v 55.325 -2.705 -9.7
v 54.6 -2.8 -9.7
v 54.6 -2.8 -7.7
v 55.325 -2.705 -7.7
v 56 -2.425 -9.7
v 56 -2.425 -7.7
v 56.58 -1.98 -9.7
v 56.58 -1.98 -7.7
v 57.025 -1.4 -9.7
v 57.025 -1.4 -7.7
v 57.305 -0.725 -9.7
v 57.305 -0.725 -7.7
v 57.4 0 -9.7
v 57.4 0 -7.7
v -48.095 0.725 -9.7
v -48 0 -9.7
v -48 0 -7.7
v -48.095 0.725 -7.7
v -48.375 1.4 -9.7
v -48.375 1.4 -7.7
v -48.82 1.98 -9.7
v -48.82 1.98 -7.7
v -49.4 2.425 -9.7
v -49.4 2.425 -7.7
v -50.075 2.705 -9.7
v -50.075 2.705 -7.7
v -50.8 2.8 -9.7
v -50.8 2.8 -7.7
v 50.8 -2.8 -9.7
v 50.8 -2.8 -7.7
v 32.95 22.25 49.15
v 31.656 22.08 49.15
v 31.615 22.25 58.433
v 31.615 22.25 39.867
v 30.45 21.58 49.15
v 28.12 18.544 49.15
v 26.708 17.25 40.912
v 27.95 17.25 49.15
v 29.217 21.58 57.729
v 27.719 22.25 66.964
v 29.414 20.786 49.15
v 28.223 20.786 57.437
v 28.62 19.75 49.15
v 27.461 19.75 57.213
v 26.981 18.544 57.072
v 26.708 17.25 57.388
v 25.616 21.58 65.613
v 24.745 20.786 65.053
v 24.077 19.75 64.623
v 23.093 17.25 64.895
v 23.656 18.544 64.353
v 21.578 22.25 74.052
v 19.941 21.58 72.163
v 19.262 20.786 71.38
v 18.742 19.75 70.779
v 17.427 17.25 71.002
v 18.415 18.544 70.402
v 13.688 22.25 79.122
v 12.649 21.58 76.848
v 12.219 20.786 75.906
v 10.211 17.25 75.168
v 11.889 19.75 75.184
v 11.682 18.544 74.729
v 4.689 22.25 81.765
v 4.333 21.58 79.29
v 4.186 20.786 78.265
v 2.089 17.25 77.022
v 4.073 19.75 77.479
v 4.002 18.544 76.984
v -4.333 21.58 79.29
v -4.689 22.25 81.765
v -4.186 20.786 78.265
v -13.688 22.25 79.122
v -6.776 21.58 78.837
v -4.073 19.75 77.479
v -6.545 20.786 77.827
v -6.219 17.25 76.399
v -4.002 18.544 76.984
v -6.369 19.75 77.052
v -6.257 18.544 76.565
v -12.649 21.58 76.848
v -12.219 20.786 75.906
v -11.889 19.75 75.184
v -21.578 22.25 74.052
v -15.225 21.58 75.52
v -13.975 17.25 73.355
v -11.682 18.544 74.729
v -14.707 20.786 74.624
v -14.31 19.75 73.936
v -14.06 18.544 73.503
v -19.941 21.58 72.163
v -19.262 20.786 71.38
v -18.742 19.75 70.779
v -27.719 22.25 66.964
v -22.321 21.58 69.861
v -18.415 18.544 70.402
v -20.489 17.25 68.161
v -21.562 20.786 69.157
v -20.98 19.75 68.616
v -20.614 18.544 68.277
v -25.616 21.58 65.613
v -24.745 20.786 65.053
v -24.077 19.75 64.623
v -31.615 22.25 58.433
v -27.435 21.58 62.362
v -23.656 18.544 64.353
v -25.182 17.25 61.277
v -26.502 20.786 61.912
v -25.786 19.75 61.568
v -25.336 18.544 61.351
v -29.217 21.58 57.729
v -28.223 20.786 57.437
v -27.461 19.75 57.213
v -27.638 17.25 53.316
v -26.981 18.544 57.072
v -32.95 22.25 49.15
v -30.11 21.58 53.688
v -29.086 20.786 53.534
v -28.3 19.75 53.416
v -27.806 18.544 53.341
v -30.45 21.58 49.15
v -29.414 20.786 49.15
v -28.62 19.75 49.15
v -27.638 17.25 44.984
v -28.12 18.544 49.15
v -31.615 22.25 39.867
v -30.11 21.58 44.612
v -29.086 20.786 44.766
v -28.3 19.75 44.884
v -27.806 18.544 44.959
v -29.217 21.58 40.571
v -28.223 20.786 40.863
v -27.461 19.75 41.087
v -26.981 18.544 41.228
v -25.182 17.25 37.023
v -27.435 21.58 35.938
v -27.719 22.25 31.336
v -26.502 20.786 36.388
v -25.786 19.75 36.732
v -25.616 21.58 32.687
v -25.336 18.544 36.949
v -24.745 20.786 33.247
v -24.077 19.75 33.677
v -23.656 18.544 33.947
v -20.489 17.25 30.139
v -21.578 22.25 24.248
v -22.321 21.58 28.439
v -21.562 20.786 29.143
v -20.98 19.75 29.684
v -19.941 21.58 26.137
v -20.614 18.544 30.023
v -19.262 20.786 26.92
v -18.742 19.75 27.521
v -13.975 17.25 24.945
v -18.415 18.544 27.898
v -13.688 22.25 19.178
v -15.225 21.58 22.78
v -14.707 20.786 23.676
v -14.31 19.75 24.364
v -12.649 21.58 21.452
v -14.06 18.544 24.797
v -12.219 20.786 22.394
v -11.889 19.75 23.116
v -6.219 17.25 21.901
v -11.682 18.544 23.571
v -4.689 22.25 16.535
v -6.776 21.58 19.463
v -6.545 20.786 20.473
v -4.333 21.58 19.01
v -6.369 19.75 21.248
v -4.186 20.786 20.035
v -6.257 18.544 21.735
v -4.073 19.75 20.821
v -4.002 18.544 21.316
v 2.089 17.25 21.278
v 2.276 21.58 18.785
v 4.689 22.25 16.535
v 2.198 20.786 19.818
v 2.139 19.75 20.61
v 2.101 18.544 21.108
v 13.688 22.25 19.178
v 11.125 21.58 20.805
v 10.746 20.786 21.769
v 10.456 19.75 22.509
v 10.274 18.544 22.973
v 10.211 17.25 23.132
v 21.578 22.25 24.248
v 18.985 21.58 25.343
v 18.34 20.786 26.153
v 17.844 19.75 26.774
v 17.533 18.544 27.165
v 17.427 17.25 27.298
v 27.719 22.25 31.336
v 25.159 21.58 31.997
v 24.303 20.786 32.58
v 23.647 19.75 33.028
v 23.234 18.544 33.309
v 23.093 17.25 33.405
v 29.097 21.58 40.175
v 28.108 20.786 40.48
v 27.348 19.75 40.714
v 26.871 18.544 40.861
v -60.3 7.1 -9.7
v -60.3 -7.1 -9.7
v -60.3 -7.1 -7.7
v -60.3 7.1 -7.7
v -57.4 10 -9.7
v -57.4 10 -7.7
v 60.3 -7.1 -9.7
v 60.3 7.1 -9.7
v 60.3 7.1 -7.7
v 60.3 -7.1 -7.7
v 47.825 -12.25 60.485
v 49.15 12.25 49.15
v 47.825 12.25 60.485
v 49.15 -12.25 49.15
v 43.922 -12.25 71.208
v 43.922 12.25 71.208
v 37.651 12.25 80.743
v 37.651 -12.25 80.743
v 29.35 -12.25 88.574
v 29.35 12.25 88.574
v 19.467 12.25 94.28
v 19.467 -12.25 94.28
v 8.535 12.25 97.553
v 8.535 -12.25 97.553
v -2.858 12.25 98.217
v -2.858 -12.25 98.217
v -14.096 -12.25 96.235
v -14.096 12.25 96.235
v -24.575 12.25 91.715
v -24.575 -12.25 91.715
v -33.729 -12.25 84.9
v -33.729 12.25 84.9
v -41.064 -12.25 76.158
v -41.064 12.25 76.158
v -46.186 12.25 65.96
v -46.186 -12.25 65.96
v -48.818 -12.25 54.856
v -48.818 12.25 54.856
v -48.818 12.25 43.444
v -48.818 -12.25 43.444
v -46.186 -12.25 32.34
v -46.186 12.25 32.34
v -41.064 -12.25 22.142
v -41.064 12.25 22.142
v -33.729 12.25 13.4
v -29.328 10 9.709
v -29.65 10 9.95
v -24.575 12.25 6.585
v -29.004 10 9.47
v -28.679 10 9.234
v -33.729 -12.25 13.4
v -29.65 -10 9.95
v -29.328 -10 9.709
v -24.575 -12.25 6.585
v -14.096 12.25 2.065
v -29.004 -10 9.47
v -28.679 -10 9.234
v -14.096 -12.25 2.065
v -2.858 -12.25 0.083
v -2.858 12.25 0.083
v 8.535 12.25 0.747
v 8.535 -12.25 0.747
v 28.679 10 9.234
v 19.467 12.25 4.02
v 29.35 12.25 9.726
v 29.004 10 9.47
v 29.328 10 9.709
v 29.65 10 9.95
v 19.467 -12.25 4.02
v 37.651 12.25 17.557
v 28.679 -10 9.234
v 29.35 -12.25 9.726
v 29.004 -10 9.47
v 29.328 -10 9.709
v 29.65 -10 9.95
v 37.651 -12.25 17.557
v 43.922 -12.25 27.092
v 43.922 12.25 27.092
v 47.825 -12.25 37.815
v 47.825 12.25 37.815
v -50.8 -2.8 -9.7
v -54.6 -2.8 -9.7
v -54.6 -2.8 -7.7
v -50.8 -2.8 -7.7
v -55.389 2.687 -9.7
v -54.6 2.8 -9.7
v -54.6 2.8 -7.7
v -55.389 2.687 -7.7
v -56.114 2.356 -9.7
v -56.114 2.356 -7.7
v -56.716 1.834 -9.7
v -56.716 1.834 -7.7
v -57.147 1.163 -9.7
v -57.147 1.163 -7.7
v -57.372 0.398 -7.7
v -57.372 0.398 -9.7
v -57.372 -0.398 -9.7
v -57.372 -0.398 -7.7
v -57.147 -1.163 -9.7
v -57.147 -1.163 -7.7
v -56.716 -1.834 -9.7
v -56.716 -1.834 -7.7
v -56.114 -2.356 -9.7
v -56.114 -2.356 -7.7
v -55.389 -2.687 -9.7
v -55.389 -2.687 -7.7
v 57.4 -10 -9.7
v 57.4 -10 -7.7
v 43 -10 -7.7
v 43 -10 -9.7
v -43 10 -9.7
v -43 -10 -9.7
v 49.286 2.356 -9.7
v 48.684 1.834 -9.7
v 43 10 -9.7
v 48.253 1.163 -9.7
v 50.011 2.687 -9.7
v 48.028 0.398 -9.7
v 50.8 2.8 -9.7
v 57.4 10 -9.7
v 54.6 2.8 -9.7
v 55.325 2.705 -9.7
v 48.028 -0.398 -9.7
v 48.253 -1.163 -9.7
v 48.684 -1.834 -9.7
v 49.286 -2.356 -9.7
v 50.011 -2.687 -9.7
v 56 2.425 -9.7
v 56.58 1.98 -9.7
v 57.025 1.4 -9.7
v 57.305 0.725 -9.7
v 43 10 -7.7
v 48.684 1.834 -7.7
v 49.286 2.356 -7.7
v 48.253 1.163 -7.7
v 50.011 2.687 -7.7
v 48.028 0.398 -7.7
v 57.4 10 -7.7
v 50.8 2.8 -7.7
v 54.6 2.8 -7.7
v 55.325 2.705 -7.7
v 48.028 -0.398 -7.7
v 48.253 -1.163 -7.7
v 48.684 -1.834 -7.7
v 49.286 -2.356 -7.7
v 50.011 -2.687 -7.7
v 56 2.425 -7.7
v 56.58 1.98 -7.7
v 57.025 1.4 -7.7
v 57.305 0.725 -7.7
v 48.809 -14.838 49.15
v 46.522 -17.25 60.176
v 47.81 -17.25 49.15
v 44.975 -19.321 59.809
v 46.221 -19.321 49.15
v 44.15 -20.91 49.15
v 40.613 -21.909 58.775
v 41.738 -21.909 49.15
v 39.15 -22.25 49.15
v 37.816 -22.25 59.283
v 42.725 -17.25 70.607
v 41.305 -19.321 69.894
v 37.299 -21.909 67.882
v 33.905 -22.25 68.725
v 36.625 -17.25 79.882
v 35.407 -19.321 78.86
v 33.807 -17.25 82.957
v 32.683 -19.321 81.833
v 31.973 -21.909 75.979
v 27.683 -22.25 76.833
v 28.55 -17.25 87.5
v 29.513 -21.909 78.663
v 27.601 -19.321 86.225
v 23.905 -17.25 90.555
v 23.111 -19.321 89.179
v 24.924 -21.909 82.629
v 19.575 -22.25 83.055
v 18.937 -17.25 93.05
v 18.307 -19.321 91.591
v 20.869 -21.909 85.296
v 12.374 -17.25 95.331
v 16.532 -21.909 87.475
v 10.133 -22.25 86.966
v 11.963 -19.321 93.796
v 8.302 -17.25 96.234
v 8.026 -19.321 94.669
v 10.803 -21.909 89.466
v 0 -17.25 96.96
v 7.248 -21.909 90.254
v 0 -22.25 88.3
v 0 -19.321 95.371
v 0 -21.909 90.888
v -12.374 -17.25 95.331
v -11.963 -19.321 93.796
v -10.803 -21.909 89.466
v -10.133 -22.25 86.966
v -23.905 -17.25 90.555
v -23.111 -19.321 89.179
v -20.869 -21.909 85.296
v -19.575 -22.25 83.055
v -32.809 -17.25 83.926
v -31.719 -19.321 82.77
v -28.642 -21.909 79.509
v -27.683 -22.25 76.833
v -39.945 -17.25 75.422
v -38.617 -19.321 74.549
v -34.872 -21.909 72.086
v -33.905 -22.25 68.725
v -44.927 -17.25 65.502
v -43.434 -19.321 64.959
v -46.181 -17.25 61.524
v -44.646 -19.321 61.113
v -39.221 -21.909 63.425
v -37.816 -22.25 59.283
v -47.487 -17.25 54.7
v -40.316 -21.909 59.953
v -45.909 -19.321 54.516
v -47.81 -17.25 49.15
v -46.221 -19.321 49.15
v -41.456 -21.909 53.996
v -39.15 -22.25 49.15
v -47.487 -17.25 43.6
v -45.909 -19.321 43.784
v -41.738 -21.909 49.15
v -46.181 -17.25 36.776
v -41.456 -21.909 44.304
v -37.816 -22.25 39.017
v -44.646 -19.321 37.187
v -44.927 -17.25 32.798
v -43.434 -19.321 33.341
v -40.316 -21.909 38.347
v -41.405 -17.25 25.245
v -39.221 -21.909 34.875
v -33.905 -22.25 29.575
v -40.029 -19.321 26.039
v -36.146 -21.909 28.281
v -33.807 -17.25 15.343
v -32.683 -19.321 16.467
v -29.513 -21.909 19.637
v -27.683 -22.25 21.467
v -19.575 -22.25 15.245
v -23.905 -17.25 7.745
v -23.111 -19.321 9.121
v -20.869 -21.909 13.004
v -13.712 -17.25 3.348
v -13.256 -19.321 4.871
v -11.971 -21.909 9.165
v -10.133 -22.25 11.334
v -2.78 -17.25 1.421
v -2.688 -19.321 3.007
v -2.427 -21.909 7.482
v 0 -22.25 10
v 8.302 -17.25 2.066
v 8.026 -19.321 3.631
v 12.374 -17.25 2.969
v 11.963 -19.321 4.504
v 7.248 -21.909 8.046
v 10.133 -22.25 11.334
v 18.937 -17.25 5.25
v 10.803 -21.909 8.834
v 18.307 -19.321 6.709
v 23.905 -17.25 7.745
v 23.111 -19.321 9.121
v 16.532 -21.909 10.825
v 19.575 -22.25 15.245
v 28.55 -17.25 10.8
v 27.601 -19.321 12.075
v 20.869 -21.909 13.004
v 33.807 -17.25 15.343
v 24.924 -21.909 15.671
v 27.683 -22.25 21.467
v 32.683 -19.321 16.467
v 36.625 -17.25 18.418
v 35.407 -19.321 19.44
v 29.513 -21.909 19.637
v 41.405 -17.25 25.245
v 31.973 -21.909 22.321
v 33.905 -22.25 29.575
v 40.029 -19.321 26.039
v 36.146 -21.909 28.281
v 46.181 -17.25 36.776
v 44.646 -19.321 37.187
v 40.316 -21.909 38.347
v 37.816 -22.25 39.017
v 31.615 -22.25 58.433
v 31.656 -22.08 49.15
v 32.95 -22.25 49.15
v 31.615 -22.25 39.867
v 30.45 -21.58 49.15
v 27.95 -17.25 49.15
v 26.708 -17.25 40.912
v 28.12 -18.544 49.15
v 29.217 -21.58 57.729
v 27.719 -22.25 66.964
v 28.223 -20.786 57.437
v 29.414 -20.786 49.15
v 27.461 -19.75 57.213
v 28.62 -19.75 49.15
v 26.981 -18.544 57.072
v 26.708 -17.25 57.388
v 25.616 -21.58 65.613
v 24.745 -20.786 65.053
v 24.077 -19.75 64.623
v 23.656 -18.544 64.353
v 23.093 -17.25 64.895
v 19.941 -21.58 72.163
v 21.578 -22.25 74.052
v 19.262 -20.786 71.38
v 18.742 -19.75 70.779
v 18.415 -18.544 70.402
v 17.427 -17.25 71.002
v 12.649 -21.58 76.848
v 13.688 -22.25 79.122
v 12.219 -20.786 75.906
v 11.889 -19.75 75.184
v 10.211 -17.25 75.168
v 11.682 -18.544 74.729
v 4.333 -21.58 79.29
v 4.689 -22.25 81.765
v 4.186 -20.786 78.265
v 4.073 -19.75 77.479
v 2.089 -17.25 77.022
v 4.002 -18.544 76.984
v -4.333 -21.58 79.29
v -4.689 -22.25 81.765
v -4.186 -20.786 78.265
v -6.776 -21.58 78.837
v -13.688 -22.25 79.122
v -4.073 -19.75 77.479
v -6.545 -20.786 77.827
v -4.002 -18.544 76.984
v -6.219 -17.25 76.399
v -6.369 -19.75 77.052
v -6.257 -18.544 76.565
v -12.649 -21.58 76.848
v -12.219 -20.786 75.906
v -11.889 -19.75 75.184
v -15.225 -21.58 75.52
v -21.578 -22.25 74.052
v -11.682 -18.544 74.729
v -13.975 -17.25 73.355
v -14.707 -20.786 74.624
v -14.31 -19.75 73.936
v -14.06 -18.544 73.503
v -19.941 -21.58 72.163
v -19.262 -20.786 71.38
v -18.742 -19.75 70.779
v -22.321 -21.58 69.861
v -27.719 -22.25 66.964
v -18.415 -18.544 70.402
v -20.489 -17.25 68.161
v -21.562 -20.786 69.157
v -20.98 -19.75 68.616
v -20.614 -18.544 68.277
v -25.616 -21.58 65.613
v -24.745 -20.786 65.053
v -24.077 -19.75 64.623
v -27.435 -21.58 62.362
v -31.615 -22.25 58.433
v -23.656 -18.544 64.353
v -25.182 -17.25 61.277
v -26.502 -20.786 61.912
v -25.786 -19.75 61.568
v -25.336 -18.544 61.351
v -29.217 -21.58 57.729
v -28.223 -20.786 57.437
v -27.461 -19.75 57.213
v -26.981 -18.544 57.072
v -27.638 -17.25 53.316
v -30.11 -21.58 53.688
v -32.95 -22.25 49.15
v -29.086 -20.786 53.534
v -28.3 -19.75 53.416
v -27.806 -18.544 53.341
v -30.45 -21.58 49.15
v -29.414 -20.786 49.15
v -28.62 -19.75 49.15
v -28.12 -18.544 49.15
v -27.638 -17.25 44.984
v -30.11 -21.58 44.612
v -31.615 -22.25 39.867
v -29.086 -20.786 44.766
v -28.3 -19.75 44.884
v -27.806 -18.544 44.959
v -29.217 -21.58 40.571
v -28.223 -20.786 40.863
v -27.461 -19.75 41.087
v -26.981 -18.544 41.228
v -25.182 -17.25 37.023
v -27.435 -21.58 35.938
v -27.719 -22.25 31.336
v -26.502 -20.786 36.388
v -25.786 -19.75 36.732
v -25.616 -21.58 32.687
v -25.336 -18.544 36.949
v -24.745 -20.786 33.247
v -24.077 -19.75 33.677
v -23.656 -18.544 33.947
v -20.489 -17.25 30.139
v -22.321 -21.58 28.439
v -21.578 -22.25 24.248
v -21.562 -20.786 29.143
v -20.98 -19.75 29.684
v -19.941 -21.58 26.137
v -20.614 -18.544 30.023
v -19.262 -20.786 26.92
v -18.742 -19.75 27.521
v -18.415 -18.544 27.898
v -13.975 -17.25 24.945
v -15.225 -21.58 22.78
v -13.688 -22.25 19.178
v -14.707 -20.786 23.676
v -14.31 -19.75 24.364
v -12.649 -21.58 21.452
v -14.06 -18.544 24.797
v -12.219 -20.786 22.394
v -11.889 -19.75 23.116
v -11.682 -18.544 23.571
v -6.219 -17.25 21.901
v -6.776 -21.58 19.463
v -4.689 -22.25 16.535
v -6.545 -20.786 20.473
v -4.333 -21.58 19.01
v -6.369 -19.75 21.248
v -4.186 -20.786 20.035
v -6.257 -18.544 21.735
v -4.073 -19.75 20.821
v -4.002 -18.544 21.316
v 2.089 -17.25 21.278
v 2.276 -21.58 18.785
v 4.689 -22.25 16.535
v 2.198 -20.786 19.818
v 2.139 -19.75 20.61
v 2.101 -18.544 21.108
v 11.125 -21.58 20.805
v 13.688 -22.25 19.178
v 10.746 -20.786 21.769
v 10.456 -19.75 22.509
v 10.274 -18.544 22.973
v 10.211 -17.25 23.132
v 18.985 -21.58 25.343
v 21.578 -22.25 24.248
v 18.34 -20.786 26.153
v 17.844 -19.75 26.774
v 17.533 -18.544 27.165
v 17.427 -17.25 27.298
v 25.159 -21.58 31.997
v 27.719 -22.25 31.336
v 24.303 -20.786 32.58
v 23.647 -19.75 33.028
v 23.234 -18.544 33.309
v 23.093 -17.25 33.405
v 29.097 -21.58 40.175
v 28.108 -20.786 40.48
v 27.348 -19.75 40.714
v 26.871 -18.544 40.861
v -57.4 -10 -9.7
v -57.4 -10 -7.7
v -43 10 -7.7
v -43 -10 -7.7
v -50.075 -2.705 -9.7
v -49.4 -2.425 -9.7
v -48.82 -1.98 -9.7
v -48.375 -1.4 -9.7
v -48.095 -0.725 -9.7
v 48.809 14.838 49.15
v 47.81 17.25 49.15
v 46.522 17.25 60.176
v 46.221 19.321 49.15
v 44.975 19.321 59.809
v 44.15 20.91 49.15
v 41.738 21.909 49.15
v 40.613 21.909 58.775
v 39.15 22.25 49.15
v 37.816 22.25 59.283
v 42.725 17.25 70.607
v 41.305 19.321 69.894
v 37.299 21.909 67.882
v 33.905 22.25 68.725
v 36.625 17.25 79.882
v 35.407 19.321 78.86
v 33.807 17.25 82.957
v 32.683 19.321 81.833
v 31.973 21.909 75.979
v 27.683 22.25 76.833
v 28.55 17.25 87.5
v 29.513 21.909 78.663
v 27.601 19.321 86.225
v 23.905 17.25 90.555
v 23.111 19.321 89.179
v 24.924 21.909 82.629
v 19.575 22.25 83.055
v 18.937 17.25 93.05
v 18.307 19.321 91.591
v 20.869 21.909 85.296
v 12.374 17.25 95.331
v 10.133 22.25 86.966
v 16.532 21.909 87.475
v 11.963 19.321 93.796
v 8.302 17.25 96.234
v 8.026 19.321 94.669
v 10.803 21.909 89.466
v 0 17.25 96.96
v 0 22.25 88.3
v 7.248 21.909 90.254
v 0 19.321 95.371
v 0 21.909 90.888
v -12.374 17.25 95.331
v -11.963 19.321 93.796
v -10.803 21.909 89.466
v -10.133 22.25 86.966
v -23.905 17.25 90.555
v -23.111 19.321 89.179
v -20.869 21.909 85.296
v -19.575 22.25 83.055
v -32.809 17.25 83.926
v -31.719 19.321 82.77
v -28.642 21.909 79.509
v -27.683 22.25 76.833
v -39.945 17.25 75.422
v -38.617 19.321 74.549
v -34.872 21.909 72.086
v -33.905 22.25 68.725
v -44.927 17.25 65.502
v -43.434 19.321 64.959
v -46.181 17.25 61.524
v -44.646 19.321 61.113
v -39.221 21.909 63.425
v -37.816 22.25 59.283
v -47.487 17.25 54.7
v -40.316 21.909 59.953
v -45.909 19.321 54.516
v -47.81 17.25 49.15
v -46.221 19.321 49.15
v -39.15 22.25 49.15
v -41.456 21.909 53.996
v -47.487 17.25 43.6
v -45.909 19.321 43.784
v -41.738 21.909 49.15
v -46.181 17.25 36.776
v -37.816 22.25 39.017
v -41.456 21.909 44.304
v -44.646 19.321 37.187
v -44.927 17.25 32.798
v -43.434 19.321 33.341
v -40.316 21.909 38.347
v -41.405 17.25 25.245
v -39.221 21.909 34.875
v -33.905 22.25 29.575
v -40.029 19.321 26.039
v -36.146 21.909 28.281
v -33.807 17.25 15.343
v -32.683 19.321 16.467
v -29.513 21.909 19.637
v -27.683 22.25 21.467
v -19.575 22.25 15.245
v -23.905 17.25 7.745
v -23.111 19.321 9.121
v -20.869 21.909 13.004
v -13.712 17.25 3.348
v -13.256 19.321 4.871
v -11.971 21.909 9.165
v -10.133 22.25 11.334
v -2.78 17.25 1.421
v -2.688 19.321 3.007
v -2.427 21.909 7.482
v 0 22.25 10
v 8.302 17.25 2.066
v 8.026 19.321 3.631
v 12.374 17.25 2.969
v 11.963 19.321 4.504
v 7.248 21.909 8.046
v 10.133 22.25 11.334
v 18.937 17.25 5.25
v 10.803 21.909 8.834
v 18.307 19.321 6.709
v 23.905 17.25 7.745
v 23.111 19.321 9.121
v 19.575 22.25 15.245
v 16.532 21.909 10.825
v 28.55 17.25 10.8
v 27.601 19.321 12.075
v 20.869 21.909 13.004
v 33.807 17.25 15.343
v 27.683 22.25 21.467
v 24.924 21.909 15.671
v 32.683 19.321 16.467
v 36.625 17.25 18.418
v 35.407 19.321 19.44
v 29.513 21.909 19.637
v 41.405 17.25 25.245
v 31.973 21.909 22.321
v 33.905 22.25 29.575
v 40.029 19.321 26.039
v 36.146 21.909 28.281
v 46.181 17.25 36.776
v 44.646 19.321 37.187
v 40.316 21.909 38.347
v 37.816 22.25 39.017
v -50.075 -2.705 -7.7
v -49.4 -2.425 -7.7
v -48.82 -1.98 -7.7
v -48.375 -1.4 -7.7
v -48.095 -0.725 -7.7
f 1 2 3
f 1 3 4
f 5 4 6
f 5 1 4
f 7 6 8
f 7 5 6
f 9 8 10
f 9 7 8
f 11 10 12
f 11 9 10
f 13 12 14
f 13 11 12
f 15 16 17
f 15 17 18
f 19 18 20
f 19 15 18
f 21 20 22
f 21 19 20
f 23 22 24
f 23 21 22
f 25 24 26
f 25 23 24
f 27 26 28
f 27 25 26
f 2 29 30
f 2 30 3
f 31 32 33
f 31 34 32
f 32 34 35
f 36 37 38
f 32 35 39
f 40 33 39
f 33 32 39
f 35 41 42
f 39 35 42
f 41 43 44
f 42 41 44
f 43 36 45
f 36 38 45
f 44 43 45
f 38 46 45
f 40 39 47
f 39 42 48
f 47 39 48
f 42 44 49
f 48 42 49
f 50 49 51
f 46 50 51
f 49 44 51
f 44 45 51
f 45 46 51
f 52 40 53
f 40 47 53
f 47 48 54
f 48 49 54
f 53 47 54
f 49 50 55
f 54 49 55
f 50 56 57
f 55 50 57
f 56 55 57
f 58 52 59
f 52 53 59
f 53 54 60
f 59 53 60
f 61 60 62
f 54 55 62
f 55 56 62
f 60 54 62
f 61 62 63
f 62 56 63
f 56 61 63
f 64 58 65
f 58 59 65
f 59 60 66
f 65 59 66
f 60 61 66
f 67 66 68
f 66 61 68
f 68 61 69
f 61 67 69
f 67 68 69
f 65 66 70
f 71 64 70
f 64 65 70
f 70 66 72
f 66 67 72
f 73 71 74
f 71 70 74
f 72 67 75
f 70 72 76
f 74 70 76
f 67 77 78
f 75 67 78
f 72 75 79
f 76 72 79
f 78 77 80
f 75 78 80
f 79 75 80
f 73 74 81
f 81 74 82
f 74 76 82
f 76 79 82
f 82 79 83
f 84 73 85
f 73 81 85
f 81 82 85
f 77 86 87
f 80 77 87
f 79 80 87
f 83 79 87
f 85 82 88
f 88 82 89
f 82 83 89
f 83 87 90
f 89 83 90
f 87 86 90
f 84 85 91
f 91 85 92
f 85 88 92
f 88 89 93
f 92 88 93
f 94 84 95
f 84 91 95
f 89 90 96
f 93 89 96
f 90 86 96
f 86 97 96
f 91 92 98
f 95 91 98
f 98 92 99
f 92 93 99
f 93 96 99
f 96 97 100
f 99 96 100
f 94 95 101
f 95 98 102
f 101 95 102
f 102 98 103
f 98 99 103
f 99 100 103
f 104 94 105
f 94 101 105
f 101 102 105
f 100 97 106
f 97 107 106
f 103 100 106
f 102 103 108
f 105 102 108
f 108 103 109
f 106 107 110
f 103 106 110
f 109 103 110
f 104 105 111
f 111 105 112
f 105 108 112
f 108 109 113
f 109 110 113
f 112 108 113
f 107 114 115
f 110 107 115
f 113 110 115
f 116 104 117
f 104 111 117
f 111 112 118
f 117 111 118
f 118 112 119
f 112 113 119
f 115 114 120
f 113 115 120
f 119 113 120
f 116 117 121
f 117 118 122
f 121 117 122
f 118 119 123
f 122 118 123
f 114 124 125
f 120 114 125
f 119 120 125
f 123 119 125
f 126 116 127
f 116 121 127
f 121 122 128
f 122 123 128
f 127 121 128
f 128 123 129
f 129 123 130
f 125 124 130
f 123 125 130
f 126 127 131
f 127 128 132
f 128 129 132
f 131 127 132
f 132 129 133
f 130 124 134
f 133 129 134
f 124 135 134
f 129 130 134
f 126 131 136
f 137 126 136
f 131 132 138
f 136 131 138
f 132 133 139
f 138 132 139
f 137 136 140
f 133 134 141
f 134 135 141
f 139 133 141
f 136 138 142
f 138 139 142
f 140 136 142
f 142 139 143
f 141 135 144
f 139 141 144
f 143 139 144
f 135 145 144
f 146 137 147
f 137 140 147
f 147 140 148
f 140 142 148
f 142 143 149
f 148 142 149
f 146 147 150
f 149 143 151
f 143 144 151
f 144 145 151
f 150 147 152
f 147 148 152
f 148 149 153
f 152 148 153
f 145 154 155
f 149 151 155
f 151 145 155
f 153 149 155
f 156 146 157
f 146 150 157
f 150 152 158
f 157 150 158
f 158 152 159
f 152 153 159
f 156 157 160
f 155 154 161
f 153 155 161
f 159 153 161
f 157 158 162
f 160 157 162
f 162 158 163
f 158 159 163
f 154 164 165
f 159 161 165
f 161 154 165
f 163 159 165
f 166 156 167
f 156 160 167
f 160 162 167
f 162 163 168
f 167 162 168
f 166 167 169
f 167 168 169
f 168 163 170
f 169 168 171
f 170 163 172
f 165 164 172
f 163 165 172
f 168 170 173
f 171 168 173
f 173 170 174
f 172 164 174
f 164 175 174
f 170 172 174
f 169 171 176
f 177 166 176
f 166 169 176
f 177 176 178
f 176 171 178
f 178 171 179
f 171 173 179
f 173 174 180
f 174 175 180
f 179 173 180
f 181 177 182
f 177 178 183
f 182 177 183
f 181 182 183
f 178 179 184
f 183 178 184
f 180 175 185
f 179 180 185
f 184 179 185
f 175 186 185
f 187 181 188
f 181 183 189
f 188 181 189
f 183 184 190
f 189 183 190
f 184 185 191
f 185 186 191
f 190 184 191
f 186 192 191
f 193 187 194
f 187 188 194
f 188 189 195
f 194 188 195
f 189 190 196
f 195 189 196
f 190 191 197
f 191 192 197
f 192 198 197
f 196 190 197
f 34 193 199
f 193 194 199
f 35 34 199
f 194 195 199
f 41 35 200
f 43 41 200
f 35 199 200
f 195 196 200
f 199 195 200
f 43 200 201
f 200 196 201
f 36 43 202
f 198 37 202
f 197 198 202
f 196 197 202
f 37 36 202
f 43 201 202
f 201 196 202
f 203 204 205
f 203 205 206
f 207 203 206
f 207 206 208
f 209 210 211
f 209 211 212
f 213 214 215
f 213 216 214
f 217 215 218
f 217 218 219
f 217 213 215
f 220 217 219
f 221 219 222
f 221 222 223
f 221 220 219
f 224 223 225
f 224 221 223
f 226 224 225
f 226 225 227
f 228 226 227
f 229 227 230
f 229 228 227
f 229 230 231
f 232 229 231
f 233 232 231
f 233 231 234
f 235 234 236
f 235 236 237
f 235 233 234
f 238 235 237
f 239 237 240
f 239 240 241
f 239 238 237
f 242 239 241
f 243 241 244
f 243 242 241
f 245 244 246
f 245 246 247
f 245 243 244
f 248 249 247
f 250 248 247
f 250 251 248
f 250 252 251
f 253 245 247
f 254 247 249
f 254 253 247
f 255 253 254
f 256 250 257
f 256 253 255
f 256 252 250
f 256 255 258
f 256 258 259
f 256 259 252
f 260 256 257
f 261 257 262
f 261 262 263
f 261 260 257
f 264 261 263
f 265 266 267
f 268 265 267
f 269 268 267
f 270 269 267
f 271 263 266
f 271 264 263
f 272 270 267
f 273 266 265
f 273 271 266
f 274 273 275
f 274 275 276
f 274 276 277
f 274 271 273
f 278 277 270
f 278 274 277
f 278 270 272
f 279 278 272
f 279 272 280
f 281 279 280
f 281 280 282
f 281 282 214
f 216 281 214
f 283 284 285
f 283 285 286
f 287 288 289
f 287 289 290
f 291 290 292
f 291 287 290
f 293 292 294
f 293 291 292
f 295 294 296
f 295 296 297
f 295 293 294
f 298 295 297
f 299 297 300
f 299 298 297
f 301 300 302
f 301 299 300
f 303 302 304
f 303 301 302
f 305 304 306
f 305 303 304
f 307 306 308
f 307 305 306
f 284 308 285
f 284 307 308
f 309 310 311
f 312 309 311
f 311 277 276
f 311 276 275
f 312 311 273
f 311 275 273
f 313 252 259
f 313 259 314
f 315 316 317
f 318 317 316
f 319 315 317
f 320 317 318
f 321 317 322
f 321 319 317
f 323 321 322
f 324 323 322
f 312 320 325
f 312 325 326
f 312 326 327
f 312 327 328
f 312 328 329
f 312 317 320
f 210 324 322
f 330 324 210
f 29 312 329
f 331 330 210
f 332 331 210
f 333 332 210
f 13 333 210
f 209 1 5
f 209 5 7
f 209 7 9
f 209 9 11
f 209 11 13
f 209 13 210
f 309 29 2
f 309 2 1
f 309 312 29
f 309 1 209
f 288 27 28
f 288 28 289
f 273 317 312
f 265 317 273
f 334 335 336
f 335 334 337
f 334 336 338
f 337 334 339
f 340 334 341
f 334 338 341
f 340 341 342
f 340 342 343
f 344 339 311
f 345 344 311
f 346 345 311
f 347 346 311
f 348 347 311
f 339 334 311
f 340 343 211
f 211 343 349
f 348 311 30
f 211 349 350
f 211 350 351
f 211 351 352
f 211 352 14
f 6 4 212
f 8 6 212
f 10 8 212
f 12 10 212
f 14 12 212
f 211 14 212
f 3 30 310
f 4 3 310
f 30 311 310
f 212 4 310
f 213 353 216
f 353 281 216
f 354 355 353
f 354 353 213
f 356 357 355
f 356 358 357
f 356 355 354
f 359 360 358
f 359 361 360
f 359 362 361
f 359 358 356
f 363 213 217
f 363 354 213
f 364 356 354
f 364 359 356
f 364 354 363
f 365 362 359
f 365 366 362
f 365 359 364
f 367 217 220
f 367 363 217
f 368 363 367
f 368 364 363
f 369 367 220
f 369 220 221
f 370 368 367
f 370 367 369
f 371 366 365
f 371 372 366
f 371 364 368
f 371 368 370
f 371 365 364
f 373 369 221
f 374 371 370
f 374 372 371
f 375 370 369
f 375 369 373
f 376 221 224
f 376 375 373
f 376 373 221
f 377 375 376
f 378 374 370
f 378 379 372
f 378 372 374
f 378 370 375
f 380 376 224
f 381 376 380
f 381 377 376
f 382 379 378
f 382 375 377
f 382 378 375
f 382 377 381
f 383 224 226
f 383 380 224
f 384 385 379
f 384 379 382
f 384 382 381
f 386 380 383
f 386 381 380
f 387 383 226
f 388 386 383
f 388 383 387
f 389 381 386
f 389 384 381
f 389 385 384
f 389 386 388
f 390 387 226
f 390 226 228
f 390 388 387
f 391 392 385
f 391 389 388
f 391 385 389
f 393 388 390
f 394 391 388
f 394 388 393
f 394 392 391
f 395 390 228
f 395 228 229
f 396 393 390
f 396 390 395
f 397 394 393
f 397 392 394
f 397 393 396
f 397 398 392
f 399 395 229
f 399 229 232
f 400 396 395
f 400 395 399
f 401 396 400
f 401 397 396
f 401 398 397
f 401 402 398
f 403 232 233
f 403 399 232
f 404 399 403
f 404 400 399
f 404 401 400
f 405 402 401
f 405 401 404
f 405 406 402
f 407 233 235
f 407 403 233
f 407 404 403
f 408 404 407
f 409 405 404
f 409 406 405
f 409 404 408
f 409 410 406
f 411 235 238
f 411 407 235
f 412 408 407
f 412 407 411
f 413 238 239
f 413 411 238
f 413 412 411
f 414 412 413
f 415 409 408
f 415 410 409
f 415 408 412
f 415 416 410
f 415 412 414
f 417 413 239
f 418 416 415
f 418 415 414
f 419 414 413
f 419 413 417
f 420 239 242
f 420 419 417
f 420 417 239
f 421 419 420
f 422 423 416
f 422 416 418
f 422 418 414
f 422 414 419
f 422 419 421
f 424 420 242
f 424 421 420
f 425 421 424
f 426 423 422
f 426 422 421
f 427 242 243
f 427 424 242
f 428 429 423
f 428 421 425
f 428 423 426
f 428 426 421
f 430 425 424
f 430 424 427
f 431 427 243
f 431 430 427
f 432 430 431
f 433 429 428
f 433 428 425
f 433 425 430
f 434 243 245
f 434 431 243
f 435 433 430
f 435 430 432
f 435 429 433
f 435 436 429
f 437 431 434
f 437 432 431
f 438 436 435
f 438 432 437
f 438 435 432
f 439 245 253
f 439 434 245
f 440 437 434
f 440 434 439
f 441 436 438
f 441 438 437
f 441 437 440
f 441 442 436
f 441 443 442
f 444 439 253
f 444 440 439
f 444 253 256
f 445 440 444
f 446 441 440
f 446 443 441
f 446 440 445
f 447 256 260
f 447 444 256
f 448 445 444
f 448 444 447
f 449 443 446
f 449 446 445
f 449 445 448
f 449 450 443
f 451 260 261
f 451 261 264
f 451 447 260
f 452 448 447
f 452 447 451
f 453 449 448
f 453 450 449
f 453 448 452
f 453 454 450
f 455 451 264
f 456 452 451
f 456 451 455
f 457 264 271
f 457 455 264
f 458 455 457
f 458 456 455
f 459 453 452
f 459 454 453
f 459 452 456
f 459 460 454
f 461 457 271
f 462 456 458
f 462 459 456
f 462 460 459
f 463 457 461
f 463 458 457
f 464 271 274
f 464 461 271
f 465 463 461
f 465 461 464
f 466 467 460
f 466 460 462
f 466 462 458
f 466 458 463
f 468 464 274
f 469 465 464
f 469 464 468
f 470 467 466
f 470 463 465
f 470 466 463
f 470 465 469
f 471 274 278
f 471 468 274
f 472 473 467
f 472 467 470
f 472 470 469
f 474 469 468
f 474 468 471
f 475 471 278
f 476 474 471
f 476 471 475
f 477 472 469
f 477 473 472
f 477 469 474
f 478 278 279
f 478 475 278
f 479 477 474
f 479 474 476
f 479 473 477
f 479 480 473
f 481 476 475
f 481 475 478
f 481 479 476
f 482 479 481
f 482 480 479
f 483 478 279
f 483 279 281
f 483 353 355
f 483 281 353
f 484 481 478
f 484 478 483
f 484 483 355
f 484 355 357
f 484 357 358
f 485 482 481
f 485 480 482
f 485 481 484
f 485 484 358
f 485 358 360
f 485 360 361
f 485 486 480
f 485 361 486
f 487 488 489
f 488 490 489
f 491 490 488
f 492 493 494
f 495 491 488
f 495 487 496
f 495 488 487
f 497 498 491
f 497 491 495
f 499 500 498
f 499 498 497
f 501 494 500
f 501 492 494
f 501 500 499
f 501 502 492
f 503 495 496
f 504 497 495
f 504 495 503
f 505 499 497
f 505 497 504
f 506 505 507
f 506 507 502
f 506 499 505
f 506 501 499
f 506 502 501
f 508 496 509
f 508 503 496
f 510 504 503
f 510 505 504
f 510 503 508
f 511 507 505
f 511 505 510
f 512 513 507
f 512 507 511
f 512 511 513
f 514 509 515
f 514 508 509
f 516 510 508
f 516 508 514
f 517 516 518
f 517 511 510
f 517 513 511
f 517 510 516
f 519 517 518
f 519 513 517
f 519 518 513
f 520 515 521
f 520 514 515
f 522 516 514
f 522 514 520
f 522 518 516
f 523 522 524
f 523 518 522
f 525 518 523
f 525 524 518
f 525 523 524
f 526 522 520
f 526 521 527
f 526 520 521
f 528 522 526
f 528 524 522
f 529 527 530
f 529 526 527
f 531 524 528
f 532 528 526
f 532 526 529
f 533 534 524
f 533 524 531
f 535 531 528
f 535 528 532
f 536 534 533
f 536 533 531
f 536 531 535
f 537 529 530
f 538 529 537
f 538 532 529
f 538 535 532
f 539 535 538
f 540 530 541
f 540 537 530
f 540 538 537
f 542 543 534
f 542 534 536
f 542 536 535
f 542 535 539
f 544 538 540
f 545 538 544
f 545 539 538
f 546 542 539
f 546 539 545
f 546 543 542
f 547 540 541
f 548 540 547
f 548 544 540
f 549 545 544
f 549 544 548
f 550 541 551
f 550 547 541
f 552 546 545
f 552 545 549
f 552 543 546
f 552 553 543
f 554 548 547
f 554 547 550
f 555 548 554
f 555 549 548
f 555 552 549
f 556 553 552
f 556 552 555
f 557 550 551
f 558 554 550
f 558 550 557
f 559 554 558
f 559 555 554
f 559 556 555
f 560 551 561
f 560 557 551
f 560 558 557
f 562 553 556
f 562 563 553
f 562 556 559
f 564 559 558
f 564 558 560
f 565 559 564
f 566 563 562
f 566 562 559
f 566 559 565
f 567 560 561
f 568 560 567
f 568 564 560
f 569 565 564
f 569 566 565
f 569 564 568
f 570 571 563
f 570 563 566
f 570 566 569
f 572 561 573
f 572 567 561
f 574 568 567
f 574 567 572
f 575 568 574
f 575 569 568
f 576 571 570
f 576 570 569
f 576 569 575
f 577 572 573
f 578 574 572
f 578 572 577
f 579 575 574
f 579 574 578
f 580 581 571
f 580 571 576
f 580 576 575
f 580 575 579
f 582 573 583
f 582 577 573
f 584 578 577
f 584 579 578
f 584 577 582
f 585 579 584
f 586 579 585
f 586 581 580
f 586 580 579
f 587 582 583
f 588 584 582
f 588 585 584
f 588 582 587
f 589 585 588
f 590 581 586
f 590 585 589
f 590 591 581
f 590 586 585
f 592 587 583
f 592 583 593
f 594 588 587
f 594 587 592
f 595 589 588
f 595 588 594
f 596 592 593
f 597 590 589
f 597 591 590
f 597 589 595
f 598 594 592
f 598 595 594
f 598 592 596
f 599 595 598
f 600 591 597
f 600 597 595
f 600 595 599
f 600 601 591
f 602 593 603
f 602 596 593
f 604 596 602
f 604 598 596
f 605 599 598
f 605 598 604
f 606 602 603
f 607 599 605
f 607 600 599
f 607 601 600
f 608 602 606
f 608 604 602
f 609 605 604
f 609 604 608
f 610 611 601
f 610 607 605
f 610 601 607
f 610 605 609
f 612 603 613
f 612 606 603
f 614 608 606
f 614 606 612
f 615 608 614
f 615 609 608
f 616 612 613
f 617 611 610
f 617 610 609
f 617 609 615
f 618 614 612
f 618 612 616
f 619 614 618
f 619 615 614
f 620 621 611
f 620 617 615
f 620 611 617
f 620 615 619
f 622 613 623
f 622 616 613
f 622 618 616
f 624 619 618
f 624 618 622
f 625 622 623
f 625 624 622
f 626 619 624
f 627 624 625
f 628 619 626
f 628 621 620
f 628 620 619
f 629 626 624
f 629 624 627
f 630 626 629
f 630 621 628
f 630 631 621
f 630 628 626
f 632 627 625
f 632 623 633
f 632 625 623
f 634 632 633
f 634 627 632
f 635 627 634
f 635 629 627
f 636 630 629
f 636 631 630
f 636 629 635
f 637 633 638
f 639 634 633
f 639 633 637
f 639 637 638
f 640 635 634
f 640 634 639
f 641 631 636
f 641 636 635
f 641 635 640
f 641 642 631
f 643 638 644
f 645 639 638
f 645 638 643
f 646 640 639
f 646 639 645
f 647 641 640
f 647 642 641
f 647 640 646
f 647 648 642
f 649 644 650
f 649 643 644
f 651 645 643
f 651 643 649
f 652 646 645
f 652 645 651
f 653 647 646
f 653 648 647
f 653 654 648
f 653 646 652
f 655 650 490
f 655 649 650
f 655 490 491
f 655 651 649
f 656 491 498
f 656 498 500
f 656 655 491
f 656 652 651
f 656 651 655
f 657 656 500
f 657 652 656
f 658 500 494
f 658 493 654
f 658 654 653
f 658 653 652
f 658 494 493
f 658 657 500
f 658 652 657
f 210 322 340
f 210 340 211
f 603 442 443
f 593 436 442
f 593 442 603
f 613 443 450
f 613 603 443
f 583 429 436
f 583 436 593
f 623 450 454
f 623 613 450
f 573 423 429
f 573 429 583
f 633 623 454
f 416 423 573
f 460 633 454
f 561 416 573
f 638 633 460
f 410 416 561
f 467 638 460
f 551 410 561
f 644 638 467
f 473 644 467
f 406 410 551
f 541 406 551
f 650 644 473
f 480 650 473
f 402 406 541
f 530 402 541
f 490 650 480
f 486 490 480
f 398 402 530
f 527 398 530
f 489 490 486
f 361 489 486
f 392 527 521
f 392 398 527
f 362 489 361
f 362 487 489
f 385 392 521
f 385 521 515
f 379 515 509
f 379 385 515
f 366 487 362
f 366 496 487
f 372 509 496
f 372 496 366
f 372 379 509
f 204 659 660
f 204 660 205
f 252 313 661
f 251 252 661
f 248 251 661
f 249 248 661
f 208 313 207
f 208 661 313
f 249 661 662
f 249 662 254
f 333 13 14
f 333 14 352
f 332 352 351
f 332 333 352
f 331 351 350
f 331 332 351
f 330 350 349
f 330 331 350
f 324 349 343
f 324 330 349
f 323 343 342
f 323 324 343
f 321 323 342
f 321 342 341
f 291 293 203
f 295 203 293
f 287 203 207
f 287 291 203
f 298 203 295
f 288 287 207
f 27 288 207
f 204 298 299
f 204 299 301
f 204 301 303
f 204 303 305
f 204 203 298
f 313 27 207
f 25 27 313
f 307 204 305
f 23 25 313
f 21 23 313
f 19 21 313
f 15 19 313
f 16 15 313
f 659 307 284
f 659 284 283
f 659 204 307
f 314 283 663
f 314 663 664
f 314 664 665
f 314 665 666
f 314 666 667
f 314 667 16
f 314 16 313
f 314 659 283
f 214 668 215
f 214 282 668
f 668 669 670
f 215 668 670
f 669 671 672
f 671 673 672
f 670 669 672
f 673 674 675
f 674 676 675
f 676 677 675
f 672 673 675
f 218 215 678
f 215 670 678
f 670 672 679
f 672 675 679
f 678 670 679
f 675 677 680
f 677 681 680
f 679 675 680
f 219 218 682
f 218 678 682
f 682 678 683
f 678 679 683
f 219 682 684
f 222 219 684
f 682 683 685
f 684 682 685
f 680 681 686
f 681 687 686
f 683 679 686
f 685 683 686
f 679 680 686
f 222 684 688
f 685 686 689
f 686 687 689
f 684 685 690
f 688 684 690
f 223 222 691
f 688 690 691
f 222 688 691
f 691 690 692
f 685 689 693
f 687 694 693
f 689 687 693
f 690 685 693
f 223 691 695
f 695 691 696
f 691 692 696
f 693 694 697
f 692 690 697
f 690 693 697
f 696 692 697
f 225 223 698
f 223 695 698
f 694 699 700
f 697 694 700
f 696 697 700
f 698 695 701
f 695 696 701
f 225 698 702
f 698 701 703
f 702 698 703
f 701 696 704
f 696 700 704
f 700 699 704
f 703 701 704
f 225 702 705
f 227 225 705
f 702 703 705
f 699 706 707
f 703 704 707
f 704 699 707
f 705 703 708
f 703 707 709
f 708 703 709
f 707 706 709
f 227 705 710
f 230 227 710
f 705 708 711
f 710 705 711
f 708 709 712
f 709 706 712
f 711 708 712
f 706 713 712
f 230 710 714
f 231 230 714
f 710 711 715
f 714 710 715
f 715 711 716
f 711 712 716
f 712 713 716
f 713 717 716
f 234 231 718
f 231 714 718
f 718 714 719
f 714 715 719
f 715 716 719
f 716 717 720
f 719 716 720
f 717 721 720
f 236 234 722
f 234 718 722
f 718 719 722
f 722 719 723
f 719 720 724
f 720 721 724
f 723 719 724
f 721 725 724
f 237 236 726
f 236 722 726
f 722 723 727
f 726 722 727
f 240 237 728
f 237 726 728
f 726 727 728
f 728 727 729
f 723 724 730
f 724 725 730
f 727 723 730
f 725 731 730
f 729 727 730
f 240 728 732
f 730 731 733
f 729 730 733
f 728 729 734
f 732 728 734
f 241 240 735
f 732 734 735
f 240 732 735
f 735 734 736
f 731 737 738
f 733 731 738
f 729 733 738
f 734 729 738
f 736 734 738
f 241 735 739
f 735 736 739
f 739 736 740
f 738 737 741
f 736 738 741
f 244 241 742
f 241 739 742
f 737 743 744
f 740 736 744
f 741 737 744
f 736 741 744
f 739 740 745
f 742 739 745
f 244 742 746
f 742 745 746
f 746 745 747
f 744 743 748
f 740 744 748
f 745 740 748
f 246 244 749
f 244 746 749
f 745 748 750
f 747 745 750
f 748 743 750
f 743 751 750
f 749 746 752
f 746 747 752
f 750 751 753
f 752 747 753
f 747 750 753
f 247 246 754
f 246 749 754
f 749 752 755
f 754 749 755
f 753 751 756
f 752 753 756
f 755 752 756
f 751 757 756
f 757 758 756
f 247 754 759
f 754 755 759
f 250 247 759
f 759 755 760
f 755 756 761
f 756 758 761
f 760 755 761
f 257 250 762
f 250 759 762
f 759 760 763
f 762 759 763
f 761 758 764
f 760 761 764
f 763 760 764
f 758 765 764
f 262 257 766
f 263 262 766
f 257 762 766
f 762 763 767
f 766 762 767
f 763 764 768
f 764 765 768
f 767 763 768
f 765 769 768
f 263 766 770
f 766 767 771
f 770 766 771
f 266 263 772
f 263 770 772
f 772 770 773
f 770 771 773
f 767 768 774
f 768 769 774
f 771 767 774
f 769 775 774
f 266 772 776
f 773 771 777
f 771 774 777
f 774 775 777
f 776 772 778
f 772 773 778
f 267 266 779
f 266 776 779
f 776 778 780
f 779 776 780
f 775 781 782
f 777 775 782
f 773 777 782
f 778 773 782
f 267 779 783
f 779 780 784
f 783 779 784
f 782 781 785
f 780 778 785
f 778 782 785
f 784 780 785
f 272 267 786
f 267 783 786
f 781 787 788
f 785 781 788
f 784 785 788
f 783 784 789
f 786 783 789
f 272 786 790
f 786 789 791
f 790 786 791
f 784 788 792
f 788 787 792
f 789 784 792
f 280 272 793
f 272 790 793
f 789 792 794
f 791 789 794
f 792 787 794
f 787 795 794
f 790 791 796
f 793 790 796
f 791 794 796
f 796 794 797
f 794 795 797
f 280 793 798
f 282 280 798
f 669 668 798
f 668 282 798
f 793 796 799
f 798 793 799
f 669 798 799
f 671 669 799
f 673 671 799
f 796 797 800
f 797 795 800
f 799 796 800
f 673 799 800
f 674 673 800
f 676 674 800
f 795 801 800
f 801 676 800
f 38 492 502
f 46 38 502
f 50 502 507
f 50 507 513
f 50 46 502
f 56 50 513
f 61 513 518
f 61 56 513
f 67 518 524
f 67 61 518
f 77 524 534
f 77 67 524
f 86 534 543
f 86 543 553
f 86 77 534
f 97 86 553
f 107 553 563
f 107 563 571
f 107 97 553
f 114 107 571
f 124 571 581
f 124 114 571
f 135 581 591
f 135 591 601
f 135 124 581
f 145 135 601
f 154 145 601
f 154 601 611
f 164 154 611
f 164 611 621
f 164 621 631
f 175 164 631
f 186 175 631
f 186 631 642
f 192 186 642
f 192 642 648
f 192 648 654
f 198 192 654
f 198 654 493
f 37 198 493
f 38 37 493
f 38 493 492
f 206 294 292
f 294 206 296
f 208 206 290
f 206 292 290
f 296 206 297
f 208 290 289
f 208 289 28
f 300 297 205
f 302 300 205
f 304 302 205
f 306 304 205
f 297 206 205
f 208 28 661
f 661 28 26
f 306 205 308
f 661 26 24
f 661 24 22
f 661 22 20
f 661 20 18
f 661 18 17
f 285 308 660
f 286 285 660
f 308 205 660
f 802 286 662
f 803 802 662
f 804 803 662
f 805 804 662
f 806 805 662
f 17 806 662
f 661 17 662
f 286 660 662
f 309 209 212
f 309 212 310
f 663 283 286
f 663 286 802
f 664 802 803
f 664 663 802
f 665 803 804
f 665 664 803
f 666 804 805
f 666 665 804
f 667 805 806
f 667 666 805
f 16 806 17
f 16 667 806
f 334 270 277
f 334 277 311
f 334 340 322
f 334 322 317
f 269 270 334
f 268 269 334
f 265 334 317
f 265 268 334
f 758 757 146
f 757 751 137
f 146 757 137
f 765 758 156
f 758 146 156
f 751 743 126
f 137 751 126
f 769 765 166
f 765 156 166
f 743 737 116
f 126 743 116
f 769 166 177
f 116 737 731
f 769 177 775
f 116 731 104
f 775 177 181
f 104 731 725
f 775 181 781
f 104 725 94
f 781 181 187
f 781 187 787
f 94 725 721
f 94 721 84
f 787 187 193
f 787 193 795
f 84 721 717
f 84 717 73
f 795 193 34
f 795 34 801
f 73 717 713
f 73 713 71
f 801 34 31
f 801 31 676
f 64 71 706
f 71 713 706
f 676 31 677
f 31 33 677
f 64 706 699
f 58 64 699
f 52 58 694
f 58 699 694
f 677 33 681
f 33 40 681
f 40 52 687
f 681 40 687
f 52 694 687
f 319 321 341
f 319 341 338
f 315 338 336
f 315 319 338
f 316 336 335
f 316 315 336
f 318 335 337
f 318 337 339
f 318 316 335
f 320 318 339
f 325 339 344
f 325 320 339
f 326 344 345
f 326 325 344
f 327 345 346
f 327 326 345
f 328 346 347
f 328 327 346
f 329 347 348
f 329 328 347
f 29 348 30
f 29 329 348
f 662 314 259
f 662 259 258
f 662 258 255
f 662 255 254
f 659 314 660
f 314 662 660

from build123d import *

# Parameters (mm, degrees)
F0_R     = 49.15
F0_R_2   = 27.95
F1_DEPTH = 22.25
F2_R     = 10
F3_R     = 5
F7_DEPTH = 2
F9_DEPTH = 20


with BuildPart() as f1:
    # F0 (on Front) → F1 (new body, symmetric)
    with BuildSketch(Plane.XZ):
        with Locations((0, 49.15)):
            Circle(F0_R)
        with Locations((0, 49.15)):
            Circle(F0_R_2, mode=Mode.SUBTRACT)
    extrude(amount=F1_DEPTH, both=True)

    # F2
    f2_edges = [f1.edges().sort_by_distance(p)[0] for p in [
        (-49.15, -22.25, 49.15),
        (-49.15, 22.25, 49.15),
    ]]
    fillet(f2_edges, radius=F2_R)

    # F3
    f3_edges = [f1.edges().sort_by_distance(p)[0] for p in [
        (-27.95, 22.25, 49.15),
        (-27.95, -22.25, 49.15),
    ]]
    fillet(f3_edges, radius=F3_R)



with BuildPart() as f7:
    # F5 (on face) → F7 (new body)
    with BuildSketch(Plane(origin=(0, 0, -9.7), x_dir=(1, 0, 0), z_dir=(0, 0, -1))):
        Polygon((43, 10), (43, -10), (57.4, -10), (60.3, -7.1), (60.3, 7.1), (57.4, 10), align=None)
        with BuildLine():
            ThreePointArc((54.6, 2.8), (56.5798989873, 1.9798989873), (57.4, 0))
            ThreePointArc((57.4, 0), (56.5798989873, -1.9798989873), (54.6, -2.8))
            Line((54.6, -2.8), (50.8, -2.8))
            ThreePointArc((50.8, -2.8), (48, 0), (50.8, 2.8))
            Line((50.8, 2.8), (54.6, 2.8))
        make_face(mode=Mode.SUBTRACT)
    extrude(amount=-F7_DEPTH)


with BuildPart() as f7b:
    # F5 (on face) → F7, piece 2 (new body)
    with BuildSketch(Plane(origin=(0, 0, -9.7), x_dir=(1, 0, 0), z_dir=(0, 0, -1))):
        Polygon((-57.4, -10), (-43, -10), (-43, 10), (-57.4, 10), (-60.3, 7.1), (-60.3, -7.1), align=None)
        with BuildLine():
            ThreePointArc((-54.6, -2.8), (-57.4, 0), (-54.6, 2.8))
            Line((-54.6, 2.8), (-50.8, 2.8))
            ThreePointArc((-50.8, 2.8), (-48.8201010127, 1.9798989873), (-48, 0))
            ThreePointArc((-48, 0), (-48.8201010127, -1.9798989873), (-50.8, -2.8))
            Line((-50.8, -2.8), (-54.6, -2.8))
        make_face(mode=Mode.SUBTRACT)
    extrude(amount=-F7_DEPTH)


with BuildPart() as f1_1:
    add(f1.part)

    add(f7.part)  # F9 merges F7

    add(f7b.part)  # F9 merges F7b
    # F8 (on face) → F9 (join, through all)
    with BuildSketch(Plane(origin=(0, 10, 0), x_dir=(-1, 0, 0), z_dir=(0, 1, 0))):
        with BuildLine():
            Line((43, -7.7), (29.6497265558, 9.9503033791))
            ThreePointArc((29.6497265558, 9.9503033791), (29.1663333729, 9.5893187927), (28.6785456751, 9.2342948458))
            Line((28.6785456751, 9.2342948458), (43, -9.7))
            Line((43, -9.7), (43, -7.7))
        make_face()
        with BuildLine():
            ThreePointArc((-28.6785456751, 9.2342948458), (-29.1663333729, 9.5893187927), (-29.6497265558, 9.9503033791))
            Line((-29.6497265558, 9.9503033791), (-43, -7.7))
            Line((-43, -7.7), (-43, -9.7))
            Line((-43, -9.7), (-28.6785456751, 9.2342948458))
        make_face()
    extrude(amount=-F9_DEPTH)


solid = f1_1.part
